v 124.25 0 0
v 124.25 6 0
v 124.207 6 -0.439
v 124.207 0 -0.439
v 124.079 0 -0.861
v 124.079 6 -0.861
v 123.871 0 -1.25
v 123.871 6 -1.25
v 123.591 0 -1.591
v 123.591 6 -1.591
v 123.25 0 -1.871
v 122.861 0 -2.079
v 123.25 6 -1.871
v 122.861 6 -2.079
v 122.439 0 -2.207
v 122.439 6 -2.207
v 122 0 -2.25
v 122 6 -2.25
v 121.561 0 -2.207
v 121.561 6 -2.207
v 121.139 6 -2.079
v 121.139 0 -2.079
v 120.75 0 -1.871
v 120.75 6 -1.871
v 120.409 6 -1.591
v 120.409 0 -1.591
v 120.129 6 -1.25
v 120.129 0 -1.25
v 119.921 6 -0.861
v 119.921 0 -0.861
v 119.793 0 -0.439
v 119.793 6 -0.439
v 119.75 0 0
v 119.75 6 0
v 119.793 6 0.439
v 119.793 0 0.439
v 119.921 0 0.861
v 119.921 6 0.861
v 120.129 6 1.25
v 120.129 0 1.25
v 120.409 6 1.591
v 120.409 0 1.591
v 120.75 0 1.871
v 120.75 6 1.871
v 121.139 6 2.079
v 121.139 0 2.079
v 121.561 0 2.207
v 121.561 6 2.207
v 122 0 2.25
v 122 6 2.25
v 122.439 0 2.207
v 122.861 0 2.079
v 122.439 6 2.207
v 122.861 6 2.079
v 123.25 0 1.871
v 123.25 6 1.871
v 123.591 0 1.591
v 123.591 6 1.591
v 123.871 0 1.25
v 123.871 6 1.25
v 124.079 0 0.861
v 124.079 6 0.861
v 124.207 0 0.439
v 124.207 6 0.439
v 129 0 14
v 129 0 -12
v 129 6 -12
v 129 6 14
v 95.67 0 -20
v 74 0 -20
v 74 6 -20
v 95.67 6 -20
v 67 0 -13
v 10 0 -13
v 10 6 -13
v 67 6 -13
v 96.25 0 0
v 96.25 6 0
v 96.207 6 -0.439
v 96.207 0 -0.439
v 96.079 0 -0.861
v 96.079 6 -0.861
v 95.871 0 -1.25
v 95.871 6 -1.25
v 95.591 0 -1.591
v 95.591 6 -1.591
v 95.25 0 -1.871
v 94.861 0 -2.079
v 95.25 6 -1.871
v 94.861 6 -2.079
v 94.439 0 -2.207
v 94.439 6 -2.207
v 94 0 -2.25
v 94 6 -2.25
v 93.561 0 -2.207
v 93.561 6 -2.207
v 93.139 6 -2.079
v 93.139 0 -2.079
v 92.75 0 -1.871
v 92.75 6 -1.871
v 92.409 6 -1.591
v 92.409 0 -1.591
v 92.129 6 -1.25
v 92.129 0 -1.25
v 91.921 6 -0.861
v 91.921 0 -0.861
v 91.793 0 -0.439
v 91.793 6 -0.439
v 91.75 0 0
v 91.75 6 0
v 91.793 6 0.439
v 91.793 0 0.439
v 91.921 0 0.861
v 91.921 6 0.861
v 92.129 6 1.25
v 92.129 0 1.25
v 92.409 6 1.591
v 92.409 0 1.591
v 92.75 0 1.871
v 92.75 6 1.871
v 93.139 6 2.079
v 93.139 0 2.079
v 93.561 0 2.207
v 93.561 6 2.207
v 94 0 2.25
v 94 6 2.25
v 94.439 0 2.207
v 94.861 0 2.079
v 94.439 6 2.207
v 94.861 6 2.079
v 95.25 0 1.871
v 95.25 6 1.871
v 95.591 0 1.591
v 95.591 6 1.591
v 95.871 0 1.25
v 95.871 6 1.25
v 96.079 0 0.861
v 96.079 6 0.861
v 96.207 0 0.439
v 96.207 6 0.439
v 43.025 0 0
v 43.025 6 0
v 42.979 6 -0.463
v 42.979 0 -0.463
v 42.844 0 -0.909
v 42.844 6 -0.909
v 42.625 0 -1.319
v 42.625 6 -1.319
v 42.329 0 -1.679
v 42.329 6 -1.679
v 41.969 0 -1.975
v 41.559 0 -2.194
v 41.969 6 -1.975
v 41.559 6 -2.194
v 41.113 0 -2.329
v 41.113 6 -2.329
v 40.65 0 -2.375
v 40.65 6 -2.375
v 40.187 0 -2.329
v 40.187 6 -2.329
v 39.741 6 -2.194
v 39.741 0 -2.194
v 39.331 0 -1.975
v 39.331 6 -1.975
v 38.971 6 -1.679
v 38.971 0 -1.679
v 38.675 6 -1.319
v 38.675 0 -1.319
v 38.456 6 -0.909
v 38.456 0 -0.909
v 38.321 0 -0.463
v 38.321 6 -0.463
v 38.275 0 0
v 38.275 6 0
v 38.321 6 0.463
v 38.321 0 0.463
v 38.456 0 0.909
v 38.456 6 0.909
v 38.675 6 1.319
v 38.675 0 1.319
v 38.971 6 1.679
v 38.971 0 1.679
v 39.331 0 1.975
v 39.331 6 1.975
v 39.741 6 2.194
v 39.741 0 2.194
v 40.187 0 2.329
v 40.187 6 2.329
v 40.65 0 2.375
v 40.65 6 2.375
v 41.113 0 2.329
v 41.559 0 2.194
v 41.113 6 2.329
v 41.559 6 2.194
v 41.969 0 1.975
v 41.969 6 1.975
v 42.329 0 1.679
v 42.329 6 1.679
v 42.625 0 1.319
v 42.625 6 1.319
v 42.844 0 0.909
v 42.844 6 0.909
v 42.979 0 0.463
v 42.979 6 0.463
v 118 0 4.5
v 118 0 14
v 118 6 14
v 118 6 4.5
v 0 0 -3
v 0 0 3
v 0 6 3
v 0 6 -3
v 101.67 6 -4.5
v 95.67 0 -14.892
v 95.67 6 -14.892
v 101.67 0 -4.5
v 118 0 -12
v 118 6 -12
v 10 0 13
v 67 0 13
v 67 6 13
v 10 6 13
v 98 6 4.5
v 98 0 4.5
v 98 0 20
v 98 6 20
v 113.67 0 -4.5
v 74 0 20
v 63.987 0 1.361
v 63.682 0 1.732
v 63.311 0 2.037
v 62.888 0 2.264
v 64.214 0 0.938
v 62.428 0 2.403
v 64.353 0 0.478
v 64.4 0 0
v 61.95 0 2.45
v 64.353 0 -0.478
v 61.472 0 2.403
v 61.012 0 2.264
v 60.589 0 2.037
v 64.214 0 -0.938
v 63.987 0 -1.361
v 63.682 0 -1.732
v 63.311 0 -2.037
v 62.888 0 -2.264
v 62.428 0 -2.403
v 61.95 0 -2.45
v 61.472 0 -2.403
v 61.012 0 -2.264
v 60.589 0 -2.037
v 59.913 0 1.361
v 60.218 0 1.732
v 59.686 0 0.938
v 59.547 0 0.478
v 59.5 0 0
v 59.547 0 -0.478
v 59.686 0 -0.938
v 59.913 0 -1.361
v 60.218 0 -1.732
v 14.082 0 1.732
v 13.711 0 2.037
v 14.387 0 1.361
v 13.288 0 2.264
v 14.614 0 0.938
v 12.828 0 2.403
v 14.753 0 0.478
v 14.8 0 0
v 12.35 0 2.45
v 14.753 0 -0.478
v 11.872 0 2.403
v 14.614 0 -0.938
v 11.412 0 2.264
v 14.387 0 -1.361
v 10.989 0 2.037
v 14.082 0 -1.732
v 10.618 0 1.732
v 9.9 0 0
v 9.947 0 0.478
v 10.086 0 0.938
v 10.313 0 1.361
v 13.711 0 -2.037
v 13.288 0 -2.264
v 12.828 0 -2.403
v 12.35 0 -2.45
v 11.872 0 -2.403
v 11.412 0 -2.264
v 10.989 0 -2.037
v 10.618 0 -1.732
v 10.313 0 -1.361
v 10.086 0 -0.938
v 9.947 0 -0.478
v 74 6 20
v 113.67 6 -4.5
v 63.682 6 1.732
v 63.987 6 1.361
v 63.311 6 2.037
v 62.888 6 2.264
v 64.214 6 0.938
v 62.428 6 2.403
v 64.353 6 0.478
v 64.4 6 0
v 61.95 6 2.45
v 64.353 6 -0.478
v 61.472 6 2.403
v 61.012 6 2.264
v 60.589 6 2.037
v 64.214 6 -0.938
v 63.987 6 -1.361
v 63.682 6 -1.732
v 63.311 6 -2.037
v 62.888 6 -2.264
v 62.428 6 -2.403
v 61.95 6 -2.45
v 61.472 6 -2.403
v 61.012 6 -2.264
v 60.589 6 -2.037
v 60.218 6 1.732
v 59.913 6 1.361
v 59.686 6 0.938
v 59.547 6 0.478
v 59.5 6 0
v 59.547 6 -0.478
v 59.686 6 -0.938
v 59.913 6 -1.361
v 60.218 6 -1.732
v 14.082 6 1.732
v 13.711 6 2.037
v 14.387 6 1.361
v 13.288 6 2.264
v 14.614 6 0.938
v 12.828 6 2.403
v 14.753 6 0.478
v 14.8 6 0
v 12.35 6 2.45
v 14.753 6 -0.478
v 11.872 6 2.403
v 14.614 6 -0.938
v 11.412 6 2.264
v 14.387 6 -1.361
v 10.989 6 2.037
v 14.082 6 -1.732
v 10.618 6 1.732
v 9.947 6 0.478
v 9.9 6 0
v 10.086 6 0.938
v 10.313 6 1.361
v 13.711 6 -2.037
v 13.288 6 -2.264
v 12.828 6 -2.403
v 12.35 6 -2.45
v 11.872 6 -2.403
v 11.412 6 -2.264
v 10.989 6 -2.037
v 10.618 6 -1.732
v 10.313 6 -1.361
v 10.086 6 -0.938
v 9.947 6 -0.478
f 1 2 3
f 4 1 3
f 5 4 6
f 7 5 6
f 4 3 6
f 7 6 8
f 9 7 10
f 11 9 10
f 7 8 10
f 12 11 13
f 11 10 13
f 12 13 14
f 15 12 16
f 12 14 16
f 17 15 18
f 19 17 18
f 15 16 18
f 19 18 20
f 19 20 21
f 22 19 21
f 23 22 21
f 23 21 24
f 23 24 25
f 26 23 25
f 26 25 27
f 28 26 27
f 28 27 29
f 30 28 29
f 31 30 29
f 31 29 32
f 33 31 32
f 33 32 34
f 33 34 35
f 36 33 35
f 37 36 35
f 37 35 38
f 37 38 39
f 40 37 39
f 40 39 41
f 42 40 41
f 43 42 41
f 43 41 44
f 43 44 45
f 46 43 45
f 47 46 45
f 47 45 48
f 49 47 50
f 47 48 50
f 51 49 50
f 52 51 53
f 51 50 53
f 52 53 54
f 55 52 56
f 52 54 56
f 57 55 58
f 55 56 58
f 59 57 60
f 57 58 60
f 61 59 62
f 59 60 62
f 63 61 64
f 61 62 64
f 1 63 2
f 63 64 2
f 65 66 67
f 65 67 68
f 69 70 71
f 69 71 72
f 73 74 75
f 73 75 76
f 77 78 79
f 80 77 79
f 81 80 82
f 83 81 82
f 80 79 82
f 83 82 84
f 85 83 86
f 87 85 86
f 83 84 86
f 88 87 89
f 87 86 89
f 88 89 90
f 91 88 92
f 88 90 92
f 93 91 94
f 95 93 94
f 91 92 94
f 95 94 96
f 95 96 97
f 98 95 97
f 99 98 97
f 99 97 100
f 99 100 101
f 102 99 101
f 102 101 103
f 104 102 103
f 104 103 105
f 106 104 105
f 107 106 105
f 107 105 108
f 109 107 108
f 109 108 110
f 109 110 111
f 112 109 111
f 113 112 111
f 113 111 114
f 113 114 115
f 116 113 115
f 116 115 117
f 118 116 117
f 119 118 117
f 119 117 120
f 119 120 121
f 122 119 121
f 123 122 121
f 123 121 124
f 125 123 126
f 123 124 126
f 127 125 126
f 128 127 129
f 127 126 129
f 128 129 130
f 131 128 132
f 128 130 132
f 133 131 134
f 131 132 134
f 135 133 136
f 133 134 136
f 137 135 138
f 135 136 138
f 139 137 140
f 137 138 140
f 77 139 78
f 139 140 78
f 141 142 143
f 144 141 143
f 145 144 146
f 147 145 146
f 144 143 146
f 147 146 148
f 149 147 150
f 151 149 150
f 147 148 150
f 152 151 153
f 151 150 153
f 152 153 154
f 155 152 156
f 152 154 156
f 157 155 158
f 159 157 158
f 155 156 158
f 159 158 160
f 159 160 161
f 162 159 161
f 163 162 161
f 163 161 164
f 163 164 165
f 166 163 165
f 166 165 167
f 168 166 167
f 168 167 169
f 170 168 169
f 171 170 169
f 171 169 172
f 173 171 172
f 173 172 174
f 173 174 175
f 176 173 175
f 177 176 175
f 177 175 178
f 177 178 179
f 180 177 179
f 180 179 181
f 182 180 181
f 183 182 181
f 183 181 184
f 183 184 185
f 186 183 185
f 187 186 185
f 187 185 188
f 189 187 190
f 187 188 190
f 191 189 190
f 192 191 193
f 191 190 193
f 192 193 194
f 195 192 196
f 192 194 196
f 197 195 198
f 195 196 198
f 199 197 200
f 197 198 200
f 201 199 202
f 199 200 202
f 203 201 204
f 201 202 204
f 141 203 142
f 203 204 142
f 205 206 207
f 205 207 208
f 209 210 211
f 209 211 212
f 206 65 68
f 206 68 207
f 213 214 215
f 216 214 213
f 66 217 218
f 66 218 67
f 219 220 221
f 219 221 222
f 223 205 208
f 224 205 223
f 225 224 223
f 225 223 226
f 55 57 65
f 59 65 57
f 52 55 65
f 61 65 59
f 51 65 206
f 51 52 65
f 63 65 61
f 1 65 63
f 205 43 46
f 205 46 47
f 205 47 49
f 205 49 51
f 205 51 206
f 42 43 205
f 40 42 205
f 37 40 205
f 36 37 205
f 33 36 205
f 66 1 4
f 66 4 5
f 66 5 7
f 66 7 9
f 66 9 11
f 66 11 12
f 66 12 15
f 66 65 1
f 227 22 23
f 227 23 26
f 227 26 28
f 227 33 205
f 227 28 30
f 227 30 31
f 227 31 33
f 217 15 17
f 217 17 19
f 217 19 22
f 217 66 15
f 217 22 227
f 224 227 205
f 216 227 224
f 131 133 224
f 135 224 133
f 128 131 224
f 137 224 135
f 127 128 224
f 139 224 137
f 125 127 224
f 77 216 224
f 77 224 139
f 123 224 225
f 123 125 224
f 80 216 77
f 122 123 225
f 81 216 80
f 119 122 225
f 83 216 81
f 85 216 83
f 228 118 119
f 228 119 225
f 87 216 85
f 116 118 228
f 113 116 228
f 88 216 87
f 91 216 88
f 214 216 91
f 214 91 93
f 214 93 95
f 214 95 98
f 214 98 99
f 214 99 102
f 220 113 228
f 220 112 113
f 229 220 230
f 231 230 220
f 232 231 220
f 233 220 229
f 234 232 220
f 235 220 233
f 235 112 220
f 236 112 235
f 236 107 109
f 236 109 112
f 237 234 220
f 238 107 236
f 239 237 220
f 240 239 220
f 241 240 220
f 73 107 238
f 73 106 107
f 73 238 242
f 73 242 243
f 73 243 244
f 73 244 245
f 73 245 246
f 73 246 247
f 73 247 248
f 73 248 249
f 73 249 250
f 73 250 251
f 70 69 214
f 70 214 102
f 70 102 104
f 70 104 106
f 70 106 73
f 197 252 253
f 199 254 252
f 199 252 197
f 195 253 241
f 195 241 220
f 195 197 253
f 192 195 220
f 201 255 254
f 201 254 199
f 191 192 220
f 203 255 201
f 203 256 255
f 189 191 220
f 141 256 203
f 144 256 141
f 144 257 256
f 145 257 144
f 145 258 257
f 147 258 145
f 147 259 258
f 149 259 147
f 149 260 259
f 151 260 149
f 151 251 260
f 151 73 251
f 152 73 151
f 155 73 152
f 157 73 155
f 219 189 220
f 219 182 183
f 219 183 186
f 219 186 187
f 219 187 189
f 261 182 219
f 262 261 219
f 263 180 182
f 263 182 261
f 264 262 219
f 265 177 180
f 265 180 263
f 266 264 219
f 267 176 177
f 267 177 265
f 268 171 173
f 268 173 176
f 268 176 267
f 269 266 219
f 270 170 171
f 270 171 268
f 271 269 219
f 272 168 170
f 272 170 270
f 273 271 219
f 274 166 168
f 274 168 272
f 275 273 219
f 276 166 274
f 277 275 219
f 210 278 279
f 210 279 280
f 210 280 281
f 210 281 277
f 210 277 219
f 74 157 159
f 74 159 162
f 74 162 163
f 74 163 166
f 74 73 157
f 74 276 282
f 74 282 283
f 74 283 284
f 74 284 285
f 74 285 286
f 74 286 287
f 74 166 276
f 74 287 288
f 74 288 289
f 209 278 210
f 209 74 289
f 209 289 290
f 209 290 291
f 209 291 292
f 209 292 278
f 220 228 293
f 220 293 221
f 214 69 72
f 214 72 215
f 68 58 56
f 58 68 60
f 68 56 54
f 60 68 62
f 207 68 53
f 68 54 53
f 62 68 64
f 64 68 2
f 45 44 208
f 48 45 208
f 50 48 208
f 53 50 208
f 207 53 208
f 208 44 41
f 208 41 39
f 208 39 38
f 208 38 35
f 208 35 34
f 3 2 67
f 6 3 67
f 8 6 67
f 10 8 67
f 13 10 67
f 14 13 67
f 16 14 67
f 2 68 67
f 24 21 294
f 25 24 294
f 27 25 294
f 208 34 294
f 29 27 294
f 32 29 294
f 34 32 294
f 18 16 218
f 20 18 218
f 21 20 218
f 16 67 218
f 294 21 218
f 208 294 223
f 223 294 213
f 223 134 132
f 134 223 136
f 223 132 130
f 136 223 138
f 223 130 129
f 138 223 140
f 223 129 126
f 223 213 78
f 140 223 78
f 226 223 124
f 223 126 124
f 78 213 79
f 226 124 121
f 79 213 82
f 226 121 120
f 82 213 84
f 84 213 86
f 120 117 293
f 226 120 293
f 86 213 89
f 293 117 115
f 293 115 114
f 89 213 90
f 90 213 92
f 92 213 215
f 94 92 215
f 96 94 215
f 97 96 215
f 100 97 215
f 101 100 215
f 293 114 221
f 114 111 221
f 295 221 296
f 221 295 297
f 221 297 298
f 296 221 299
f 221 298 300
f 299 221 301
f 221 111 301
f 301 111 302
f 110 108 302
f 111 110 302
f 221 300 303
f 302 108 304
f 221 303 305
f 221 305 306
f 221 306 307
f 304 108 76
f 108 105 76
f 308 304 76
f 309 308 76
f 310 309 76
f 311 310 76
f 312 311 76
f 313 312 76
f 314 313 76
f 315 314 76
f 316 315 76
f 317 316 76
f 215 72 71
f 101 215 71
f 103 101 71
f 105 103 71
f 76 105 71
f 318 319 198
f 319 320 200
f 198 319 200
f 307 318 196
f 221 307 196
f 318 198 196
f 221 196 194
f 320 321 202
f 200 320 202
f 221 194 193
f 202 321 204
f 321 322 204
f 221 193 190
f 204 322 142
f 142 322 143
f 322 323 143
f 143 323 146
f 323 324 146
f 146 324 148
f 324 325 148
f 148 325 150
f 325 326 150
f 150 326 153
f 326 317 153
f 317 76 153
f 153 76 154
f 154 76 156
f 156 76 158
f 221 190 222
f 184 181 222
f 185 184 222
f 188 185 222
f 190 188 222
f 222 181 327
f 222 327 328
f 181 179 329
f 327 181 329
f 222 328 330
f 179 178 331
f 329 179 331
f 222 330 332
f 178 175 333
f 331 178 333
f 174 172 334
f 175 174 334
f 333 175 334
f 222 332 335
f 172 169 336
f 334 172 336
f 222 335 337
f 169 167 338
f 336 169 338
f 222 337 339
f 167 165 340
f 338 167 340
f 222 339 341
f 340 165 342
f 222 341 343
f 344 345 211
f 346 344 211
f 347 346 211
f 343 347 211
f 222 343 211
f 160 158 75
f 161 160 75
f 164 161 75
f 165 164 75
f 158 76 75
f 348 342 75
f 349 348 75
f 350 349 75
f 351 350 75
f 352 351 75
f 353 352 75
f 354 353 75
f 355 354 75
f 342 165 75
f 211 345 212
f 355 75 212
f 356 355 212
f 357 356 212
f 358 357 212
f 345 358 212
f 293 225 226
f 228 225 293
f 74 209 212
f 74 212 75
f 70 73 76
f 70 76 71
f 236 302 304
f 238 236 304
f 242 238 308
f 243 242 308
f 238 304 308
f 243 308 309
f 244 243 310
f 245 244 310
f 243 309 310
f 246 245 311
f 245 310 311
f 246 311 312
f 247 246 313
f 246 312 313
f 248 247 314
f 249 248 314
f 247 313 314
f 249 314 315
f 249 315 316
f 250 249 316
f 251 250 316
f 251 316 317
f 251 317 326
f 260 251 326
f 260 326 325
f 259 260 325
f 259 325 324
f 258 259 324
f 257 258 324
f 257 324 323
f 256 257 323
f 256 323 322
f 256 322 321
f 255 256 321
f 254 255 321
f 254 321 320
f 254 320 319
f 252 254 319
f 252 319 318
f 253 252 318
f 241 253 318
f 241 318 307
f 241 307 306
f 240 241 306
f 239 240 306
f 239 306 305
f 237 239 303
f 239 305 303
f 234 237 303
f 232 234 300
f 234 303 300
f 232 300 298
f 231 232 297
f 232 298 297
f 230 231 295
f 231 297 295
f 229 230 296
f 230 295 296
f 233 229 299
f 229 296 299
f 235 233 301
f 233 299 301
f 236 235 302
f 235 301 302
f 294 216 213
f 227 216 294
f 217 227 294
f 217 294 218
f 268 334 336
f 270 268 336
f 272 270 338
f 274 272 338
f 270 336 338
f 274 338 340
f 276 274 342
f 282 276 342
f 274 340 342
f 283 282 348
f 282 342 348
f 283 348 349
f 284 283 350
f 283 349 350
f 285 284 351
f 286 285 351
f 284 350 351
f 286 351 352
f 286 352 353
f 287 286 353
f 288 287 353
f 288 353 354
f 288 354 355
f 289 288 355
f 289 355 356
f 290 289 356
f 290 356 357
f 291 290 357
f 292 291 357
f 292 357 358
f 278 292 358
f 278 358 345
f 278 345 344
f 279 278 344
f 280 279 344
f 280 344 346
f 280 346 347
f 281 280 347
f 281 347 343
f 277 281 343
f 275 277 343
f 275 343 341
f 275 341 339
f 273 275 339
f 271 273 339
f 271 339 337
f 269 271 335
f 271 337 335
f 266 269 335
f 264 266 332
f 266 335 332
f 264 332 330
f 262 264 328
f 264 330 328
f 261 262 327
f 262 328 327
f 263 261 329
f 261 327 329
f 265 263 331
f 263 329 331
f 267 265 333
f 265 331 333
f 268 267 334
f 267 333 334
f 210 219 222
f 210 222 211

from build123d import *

# Parameters (mm, degrees)
BOSS_EXTRUDE1_DEPTH = 6
SKETCH2_R           = 2.45
SKETCH2_R_2         = 2.375
SKETCH2_R_3         = 2.25
CUT_EXTRUDE1_DEPTH  = 7


with BuildPart() as part:
    # Sketch1 → Boss-Extrude1 (new body)
    with BuildSketch(Plane(origin=(0, 0, 0), x_dir=(1, 0, 0), z_dir=(0, 1, 0))):
        Polygon((10, 13), (67, 13), (74, 20), (95.669872981, 20), (95.669872981, 14.892304845), (101.669872981, 4.5), (113.669872981, 4.5), (118, 12), (129, 12), (129, -14), (118, -14), (118, -4.5), (98, -4.5), (98, -20), (74, -20), (67, -13), (10, -13), (0, -3), (0, 3), align=None)
    extrude(amount=BOSS_EXTRUDE1_DEPTH)

    # Sketch2 → Cut-Extrude1 (cut, through all)
    with BuildSketch(Plane(origin=(0, 6, 0), x_dir=(1, 0, 0), z_dir=(0, 1, 0))):
        with Locations((12.35, 0)):
            Circle(SKETCH2_R)
        with Locations((40.65, 0)):
            Circle(SKETCH2_R_2)
        with Locations((61.95, 0)):
            Circle(SKETCH2_R)
        with Locations((94, 0)):
            Circle(SKETCH2_R_3)
        with Locations((122, 0)):
            Circle(SKETCH2_R_3)
    extrude(amount=-CUT_EXTRUDE1_DEPTH, mode=Mode.SUBTRACT)


solid = part.part
